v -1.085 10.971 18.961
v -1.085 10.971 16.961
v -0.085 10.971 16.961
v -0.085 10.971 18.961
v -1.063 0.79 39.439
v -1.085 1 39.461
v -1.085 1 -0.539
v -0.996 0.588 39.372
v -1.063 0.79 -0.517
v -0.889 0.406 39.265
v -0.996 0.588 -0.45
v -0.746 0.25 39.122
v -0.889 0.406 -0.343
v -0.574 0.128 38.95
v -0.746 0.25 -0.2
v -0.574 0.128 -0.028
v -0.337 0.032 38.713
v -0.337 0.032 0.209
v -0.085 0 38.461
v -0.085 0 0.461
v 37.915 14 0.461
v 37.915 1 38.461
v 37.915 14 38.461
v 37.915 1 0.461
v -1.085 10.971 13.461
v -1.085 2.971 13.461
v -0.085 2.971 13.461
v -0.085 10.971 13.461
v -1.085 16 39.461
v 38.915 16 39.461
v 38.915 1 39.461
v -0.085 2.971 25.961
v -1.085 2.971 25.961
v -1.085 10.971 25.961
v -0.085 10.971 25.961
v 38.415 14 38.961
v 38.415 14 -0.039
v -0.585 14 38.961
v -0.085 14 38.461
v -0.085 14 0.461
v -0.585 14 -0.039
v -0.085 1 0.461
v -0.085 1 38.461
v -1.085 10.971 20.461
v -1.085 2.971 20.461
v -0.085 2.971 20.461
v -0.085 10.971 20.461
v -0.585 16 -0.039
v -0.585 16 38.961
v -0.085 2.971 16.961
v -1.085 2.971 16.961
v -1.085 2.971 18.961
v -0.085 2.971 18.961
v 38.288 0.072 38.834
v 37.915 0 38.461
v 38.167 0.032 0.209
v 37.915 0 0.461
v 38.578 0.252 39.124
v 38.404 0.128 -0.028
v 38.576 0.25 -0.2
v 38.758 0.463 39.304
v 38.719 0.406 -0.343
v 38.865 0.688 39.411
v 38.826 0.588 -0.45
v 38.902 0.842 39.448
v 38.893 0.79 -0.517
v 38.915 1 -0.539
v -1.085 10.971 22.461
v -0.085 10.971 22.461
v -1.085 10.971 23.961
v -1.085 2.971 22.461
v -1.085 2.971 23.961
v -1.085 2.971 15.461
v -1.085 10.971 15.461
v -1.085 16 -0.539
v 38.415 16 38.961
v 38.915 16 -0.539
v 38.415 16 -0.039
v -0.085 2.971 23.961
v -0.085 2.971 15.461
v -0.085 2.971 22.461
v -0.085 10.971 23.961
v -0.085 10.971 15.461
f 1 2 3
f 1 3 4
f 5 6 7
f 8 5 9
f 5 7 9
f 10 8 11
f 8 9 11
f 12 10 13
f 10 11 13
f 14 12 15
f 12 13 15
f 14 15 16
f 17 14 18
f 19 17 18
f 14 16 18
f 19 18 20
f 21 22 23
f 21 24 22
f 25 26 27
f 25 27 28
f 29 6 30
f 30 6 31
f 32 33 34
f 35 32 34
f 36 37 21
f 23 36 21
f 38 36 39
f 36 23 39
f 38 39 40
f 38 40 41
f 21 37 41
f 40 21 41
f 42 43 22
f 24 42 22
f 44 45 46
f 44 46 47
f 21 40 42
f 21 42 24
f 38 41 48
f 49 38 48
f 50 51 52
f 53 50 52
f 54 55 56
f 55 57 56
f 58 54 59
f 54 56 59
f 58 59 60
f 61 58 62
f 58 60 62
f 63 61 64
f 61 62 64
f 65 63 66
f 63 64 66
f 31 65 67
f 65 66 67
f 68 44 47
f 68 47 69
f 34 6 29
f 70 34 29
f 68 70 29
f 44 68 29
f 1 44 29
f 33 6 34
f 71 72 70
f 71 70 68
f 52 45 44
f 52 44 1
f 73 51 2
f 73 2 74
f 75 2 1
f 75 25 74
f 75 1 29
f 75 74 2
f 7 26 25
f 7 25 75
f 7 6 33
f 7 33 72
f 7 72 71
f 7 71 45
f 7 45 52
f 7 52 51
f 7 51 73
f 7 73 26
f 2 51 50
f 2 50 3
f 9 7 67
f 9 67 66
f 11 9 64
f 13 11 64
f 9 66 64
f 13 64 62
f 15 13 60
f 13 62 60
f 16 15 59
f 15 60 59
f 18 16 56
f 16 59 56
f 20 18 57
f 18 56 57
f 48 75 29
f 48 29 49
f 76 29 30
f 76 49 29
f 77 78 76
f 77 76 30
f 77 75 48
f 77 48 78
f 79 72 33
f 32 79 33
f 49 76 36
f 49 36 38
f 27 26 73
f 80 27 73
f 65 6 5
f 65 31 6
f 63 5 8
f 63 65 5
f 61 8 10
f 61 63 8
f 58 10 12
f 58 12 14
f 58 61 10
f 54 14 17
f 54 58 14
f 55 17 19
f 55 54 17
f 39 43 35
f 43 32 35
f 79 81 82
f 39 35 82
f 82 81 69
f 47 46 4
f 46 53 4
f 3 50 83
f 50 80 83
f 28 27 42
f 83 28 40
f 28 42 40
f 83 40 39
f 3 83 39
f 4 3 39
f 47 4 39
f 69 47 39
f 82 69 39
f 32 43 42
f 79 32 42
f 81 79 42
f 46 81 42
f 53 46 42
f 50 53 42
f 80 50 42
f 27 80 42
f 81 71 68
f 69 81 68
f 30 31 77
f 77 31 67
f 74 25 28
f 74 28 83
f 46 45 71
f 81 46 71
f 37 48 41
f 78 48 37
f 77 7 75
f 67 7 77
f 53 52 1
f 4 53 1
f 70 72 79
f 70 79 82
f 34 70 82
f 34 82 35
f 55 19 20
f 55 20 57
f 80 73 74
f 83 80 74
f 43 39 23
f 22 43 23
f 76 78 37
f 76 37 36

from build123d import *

# Parameters (mm, degrees)
SKETCH_1_W          = 40
SKETCH_1_H          = 40
EXTRUDE_1_DEPTH     = 16
SKETCH_2_W          = 38
SKETCH_2_H          = 38
CUT_EXTRUDE_2_DEPTH = 15
FILLET_2_R          = 1
SKETCH_5_W          = 38
SKETCH_5_H          = 2
CUT_EXTRUDE_4_DEPTH = 0.5
SKETCH_6_W          = 38.5
SKETCH_6_H          = 2
CUT_EXTRUDE_5_DEPTH = 0.5
SKETCH_7_W          = 38.5
SKETCH_7_H          = 2
CUT_EXTRUDE_6_DEPTH = 0.5
SKETCH_8_W          = 39
SKETCH_8_H          = 2
CUT_EXTRUDE_7_DEPTH = 0.5
SKETCH_9_W          = 2
SKETCH_9_H          = 8
CUT_EXTRUDE_9_DEPTH = 10


with BuildPart() as part:
    # Эскиз1 → Бобышка-Вытянуть1 (new body)
    with BuildSketch(Plane(origin=(0, 0, 0), x_dir=(1, 0, 0), z_dir=(0, 1, 0))):
        with Locations((18.915, -19.461)):
            Rectangle(SKETCH_1_W, SKETCH_1_H)
    extrude(amount=EXTRUDE_1_DEPTH)

    # Эскиз2 → Вырез-Вытянуть2 (cut)
    with BuildSketch(Plane(origin=(0, 16, 0), x_dir=(1, 0, 0), z_dir=(0, 1, 0))):
        with Locations((18.915, -19.461)):
            Rectangle(SKETCH_2_W, SKETCH_2_H)
    extrude(amount=-CUT_EXTRUDE_2_DEPTH, mode=Mode.SUBTRACT)

    # Скругление2
    fillet_2_edges = [part.edges().sort_by_distance(p)[0] for p in [
        (18.915, 0, -0.539),
        (38.915, 0, 19.461),
        (18.915, 0, 39.461),
        (-1.085, 0, 19.461),
    ]]
    fillet(fillet_2_edges, radius=FILLET_2_R)

    # Эскиз5 → Вырез-Вытянуть4 (cut)
    with BuildSketch(Plane(origin=(0, 0, 38.461), x_dir=(-1, 0, 0), z_dir=(0, 0, -1))):
        with Locations((-18.915, 15)):
            Rectangle(SKETCH_5_W, SKETCH_5_H)
    extrude(amount=-CUT_EXTRUDE_4_DEPTH, mode=Mode.SUBTRACT)

    # Эскиз6 → Вырез-Вытянуть5 (cut)
    with BuildSketch(Plane(origin=(-0.085, 0, 0), x_dir=(0, 0, -1), z_dir=(1, 0, 0))):
        with Locations((-19.711, 15)):
            Rectangle(SKETCH_6_W, SKETCH_6_H)
    extrude(amount=-CUT_EXTRUDE_5_DEPTH, mode=Mode.SUBTRACT)

    # Эскиз7 → Вырез-Вытянуть6 (cut)
    with BuildSketch(Plane.XY.offset(0.461)):
        with Locations((18.665, 15)):
            Rectangle(SKETCH_7_W, SKETCH_7_H)
    extrude(amount=-CUT_EXTRUDE_6_DEPTH, mode=Mode.SUBTRACT)

    # Эскиз8 → Вырез-Вытянуть7 (cut)
    with BuildSketch(Plane.ZY.offset(-37.915)):
        with Locations((19.461, 15)):
            Rectangle(SKETCH_8_W, SKETCH_8_H)
    extrude(amount=-CUT_EXTRUDE_7_DEPTH, mode=Mode.SUBTRACT)

    # Эскиз9 → Вырез-Вытянуть9 (cut)
    with BuildSketch(Plane.ZY.offset(1.085)):
        with Locations((17.961, 6.970991383)):
            Rectangle(SKETCH_9_W, SKETCH_9_H)
        with Locations((14.461, 6.970991383)):
            Rectangle(SKETCH_9_W, SKETCH_9_H)
        with Locations((21.461, 6.970991383)):
            Rectangle(SKETCH_9_W, SKETCH_9_H)
        with Locations((24.961, 6.970991383)):
            Rectangle(SKETCH_9_W, SKETCH_9_H)
    extrude(amount=-CUT_EXTRUDE_9_DEPTH, mode=Mode.SUBTRACT)


solid = part.part
